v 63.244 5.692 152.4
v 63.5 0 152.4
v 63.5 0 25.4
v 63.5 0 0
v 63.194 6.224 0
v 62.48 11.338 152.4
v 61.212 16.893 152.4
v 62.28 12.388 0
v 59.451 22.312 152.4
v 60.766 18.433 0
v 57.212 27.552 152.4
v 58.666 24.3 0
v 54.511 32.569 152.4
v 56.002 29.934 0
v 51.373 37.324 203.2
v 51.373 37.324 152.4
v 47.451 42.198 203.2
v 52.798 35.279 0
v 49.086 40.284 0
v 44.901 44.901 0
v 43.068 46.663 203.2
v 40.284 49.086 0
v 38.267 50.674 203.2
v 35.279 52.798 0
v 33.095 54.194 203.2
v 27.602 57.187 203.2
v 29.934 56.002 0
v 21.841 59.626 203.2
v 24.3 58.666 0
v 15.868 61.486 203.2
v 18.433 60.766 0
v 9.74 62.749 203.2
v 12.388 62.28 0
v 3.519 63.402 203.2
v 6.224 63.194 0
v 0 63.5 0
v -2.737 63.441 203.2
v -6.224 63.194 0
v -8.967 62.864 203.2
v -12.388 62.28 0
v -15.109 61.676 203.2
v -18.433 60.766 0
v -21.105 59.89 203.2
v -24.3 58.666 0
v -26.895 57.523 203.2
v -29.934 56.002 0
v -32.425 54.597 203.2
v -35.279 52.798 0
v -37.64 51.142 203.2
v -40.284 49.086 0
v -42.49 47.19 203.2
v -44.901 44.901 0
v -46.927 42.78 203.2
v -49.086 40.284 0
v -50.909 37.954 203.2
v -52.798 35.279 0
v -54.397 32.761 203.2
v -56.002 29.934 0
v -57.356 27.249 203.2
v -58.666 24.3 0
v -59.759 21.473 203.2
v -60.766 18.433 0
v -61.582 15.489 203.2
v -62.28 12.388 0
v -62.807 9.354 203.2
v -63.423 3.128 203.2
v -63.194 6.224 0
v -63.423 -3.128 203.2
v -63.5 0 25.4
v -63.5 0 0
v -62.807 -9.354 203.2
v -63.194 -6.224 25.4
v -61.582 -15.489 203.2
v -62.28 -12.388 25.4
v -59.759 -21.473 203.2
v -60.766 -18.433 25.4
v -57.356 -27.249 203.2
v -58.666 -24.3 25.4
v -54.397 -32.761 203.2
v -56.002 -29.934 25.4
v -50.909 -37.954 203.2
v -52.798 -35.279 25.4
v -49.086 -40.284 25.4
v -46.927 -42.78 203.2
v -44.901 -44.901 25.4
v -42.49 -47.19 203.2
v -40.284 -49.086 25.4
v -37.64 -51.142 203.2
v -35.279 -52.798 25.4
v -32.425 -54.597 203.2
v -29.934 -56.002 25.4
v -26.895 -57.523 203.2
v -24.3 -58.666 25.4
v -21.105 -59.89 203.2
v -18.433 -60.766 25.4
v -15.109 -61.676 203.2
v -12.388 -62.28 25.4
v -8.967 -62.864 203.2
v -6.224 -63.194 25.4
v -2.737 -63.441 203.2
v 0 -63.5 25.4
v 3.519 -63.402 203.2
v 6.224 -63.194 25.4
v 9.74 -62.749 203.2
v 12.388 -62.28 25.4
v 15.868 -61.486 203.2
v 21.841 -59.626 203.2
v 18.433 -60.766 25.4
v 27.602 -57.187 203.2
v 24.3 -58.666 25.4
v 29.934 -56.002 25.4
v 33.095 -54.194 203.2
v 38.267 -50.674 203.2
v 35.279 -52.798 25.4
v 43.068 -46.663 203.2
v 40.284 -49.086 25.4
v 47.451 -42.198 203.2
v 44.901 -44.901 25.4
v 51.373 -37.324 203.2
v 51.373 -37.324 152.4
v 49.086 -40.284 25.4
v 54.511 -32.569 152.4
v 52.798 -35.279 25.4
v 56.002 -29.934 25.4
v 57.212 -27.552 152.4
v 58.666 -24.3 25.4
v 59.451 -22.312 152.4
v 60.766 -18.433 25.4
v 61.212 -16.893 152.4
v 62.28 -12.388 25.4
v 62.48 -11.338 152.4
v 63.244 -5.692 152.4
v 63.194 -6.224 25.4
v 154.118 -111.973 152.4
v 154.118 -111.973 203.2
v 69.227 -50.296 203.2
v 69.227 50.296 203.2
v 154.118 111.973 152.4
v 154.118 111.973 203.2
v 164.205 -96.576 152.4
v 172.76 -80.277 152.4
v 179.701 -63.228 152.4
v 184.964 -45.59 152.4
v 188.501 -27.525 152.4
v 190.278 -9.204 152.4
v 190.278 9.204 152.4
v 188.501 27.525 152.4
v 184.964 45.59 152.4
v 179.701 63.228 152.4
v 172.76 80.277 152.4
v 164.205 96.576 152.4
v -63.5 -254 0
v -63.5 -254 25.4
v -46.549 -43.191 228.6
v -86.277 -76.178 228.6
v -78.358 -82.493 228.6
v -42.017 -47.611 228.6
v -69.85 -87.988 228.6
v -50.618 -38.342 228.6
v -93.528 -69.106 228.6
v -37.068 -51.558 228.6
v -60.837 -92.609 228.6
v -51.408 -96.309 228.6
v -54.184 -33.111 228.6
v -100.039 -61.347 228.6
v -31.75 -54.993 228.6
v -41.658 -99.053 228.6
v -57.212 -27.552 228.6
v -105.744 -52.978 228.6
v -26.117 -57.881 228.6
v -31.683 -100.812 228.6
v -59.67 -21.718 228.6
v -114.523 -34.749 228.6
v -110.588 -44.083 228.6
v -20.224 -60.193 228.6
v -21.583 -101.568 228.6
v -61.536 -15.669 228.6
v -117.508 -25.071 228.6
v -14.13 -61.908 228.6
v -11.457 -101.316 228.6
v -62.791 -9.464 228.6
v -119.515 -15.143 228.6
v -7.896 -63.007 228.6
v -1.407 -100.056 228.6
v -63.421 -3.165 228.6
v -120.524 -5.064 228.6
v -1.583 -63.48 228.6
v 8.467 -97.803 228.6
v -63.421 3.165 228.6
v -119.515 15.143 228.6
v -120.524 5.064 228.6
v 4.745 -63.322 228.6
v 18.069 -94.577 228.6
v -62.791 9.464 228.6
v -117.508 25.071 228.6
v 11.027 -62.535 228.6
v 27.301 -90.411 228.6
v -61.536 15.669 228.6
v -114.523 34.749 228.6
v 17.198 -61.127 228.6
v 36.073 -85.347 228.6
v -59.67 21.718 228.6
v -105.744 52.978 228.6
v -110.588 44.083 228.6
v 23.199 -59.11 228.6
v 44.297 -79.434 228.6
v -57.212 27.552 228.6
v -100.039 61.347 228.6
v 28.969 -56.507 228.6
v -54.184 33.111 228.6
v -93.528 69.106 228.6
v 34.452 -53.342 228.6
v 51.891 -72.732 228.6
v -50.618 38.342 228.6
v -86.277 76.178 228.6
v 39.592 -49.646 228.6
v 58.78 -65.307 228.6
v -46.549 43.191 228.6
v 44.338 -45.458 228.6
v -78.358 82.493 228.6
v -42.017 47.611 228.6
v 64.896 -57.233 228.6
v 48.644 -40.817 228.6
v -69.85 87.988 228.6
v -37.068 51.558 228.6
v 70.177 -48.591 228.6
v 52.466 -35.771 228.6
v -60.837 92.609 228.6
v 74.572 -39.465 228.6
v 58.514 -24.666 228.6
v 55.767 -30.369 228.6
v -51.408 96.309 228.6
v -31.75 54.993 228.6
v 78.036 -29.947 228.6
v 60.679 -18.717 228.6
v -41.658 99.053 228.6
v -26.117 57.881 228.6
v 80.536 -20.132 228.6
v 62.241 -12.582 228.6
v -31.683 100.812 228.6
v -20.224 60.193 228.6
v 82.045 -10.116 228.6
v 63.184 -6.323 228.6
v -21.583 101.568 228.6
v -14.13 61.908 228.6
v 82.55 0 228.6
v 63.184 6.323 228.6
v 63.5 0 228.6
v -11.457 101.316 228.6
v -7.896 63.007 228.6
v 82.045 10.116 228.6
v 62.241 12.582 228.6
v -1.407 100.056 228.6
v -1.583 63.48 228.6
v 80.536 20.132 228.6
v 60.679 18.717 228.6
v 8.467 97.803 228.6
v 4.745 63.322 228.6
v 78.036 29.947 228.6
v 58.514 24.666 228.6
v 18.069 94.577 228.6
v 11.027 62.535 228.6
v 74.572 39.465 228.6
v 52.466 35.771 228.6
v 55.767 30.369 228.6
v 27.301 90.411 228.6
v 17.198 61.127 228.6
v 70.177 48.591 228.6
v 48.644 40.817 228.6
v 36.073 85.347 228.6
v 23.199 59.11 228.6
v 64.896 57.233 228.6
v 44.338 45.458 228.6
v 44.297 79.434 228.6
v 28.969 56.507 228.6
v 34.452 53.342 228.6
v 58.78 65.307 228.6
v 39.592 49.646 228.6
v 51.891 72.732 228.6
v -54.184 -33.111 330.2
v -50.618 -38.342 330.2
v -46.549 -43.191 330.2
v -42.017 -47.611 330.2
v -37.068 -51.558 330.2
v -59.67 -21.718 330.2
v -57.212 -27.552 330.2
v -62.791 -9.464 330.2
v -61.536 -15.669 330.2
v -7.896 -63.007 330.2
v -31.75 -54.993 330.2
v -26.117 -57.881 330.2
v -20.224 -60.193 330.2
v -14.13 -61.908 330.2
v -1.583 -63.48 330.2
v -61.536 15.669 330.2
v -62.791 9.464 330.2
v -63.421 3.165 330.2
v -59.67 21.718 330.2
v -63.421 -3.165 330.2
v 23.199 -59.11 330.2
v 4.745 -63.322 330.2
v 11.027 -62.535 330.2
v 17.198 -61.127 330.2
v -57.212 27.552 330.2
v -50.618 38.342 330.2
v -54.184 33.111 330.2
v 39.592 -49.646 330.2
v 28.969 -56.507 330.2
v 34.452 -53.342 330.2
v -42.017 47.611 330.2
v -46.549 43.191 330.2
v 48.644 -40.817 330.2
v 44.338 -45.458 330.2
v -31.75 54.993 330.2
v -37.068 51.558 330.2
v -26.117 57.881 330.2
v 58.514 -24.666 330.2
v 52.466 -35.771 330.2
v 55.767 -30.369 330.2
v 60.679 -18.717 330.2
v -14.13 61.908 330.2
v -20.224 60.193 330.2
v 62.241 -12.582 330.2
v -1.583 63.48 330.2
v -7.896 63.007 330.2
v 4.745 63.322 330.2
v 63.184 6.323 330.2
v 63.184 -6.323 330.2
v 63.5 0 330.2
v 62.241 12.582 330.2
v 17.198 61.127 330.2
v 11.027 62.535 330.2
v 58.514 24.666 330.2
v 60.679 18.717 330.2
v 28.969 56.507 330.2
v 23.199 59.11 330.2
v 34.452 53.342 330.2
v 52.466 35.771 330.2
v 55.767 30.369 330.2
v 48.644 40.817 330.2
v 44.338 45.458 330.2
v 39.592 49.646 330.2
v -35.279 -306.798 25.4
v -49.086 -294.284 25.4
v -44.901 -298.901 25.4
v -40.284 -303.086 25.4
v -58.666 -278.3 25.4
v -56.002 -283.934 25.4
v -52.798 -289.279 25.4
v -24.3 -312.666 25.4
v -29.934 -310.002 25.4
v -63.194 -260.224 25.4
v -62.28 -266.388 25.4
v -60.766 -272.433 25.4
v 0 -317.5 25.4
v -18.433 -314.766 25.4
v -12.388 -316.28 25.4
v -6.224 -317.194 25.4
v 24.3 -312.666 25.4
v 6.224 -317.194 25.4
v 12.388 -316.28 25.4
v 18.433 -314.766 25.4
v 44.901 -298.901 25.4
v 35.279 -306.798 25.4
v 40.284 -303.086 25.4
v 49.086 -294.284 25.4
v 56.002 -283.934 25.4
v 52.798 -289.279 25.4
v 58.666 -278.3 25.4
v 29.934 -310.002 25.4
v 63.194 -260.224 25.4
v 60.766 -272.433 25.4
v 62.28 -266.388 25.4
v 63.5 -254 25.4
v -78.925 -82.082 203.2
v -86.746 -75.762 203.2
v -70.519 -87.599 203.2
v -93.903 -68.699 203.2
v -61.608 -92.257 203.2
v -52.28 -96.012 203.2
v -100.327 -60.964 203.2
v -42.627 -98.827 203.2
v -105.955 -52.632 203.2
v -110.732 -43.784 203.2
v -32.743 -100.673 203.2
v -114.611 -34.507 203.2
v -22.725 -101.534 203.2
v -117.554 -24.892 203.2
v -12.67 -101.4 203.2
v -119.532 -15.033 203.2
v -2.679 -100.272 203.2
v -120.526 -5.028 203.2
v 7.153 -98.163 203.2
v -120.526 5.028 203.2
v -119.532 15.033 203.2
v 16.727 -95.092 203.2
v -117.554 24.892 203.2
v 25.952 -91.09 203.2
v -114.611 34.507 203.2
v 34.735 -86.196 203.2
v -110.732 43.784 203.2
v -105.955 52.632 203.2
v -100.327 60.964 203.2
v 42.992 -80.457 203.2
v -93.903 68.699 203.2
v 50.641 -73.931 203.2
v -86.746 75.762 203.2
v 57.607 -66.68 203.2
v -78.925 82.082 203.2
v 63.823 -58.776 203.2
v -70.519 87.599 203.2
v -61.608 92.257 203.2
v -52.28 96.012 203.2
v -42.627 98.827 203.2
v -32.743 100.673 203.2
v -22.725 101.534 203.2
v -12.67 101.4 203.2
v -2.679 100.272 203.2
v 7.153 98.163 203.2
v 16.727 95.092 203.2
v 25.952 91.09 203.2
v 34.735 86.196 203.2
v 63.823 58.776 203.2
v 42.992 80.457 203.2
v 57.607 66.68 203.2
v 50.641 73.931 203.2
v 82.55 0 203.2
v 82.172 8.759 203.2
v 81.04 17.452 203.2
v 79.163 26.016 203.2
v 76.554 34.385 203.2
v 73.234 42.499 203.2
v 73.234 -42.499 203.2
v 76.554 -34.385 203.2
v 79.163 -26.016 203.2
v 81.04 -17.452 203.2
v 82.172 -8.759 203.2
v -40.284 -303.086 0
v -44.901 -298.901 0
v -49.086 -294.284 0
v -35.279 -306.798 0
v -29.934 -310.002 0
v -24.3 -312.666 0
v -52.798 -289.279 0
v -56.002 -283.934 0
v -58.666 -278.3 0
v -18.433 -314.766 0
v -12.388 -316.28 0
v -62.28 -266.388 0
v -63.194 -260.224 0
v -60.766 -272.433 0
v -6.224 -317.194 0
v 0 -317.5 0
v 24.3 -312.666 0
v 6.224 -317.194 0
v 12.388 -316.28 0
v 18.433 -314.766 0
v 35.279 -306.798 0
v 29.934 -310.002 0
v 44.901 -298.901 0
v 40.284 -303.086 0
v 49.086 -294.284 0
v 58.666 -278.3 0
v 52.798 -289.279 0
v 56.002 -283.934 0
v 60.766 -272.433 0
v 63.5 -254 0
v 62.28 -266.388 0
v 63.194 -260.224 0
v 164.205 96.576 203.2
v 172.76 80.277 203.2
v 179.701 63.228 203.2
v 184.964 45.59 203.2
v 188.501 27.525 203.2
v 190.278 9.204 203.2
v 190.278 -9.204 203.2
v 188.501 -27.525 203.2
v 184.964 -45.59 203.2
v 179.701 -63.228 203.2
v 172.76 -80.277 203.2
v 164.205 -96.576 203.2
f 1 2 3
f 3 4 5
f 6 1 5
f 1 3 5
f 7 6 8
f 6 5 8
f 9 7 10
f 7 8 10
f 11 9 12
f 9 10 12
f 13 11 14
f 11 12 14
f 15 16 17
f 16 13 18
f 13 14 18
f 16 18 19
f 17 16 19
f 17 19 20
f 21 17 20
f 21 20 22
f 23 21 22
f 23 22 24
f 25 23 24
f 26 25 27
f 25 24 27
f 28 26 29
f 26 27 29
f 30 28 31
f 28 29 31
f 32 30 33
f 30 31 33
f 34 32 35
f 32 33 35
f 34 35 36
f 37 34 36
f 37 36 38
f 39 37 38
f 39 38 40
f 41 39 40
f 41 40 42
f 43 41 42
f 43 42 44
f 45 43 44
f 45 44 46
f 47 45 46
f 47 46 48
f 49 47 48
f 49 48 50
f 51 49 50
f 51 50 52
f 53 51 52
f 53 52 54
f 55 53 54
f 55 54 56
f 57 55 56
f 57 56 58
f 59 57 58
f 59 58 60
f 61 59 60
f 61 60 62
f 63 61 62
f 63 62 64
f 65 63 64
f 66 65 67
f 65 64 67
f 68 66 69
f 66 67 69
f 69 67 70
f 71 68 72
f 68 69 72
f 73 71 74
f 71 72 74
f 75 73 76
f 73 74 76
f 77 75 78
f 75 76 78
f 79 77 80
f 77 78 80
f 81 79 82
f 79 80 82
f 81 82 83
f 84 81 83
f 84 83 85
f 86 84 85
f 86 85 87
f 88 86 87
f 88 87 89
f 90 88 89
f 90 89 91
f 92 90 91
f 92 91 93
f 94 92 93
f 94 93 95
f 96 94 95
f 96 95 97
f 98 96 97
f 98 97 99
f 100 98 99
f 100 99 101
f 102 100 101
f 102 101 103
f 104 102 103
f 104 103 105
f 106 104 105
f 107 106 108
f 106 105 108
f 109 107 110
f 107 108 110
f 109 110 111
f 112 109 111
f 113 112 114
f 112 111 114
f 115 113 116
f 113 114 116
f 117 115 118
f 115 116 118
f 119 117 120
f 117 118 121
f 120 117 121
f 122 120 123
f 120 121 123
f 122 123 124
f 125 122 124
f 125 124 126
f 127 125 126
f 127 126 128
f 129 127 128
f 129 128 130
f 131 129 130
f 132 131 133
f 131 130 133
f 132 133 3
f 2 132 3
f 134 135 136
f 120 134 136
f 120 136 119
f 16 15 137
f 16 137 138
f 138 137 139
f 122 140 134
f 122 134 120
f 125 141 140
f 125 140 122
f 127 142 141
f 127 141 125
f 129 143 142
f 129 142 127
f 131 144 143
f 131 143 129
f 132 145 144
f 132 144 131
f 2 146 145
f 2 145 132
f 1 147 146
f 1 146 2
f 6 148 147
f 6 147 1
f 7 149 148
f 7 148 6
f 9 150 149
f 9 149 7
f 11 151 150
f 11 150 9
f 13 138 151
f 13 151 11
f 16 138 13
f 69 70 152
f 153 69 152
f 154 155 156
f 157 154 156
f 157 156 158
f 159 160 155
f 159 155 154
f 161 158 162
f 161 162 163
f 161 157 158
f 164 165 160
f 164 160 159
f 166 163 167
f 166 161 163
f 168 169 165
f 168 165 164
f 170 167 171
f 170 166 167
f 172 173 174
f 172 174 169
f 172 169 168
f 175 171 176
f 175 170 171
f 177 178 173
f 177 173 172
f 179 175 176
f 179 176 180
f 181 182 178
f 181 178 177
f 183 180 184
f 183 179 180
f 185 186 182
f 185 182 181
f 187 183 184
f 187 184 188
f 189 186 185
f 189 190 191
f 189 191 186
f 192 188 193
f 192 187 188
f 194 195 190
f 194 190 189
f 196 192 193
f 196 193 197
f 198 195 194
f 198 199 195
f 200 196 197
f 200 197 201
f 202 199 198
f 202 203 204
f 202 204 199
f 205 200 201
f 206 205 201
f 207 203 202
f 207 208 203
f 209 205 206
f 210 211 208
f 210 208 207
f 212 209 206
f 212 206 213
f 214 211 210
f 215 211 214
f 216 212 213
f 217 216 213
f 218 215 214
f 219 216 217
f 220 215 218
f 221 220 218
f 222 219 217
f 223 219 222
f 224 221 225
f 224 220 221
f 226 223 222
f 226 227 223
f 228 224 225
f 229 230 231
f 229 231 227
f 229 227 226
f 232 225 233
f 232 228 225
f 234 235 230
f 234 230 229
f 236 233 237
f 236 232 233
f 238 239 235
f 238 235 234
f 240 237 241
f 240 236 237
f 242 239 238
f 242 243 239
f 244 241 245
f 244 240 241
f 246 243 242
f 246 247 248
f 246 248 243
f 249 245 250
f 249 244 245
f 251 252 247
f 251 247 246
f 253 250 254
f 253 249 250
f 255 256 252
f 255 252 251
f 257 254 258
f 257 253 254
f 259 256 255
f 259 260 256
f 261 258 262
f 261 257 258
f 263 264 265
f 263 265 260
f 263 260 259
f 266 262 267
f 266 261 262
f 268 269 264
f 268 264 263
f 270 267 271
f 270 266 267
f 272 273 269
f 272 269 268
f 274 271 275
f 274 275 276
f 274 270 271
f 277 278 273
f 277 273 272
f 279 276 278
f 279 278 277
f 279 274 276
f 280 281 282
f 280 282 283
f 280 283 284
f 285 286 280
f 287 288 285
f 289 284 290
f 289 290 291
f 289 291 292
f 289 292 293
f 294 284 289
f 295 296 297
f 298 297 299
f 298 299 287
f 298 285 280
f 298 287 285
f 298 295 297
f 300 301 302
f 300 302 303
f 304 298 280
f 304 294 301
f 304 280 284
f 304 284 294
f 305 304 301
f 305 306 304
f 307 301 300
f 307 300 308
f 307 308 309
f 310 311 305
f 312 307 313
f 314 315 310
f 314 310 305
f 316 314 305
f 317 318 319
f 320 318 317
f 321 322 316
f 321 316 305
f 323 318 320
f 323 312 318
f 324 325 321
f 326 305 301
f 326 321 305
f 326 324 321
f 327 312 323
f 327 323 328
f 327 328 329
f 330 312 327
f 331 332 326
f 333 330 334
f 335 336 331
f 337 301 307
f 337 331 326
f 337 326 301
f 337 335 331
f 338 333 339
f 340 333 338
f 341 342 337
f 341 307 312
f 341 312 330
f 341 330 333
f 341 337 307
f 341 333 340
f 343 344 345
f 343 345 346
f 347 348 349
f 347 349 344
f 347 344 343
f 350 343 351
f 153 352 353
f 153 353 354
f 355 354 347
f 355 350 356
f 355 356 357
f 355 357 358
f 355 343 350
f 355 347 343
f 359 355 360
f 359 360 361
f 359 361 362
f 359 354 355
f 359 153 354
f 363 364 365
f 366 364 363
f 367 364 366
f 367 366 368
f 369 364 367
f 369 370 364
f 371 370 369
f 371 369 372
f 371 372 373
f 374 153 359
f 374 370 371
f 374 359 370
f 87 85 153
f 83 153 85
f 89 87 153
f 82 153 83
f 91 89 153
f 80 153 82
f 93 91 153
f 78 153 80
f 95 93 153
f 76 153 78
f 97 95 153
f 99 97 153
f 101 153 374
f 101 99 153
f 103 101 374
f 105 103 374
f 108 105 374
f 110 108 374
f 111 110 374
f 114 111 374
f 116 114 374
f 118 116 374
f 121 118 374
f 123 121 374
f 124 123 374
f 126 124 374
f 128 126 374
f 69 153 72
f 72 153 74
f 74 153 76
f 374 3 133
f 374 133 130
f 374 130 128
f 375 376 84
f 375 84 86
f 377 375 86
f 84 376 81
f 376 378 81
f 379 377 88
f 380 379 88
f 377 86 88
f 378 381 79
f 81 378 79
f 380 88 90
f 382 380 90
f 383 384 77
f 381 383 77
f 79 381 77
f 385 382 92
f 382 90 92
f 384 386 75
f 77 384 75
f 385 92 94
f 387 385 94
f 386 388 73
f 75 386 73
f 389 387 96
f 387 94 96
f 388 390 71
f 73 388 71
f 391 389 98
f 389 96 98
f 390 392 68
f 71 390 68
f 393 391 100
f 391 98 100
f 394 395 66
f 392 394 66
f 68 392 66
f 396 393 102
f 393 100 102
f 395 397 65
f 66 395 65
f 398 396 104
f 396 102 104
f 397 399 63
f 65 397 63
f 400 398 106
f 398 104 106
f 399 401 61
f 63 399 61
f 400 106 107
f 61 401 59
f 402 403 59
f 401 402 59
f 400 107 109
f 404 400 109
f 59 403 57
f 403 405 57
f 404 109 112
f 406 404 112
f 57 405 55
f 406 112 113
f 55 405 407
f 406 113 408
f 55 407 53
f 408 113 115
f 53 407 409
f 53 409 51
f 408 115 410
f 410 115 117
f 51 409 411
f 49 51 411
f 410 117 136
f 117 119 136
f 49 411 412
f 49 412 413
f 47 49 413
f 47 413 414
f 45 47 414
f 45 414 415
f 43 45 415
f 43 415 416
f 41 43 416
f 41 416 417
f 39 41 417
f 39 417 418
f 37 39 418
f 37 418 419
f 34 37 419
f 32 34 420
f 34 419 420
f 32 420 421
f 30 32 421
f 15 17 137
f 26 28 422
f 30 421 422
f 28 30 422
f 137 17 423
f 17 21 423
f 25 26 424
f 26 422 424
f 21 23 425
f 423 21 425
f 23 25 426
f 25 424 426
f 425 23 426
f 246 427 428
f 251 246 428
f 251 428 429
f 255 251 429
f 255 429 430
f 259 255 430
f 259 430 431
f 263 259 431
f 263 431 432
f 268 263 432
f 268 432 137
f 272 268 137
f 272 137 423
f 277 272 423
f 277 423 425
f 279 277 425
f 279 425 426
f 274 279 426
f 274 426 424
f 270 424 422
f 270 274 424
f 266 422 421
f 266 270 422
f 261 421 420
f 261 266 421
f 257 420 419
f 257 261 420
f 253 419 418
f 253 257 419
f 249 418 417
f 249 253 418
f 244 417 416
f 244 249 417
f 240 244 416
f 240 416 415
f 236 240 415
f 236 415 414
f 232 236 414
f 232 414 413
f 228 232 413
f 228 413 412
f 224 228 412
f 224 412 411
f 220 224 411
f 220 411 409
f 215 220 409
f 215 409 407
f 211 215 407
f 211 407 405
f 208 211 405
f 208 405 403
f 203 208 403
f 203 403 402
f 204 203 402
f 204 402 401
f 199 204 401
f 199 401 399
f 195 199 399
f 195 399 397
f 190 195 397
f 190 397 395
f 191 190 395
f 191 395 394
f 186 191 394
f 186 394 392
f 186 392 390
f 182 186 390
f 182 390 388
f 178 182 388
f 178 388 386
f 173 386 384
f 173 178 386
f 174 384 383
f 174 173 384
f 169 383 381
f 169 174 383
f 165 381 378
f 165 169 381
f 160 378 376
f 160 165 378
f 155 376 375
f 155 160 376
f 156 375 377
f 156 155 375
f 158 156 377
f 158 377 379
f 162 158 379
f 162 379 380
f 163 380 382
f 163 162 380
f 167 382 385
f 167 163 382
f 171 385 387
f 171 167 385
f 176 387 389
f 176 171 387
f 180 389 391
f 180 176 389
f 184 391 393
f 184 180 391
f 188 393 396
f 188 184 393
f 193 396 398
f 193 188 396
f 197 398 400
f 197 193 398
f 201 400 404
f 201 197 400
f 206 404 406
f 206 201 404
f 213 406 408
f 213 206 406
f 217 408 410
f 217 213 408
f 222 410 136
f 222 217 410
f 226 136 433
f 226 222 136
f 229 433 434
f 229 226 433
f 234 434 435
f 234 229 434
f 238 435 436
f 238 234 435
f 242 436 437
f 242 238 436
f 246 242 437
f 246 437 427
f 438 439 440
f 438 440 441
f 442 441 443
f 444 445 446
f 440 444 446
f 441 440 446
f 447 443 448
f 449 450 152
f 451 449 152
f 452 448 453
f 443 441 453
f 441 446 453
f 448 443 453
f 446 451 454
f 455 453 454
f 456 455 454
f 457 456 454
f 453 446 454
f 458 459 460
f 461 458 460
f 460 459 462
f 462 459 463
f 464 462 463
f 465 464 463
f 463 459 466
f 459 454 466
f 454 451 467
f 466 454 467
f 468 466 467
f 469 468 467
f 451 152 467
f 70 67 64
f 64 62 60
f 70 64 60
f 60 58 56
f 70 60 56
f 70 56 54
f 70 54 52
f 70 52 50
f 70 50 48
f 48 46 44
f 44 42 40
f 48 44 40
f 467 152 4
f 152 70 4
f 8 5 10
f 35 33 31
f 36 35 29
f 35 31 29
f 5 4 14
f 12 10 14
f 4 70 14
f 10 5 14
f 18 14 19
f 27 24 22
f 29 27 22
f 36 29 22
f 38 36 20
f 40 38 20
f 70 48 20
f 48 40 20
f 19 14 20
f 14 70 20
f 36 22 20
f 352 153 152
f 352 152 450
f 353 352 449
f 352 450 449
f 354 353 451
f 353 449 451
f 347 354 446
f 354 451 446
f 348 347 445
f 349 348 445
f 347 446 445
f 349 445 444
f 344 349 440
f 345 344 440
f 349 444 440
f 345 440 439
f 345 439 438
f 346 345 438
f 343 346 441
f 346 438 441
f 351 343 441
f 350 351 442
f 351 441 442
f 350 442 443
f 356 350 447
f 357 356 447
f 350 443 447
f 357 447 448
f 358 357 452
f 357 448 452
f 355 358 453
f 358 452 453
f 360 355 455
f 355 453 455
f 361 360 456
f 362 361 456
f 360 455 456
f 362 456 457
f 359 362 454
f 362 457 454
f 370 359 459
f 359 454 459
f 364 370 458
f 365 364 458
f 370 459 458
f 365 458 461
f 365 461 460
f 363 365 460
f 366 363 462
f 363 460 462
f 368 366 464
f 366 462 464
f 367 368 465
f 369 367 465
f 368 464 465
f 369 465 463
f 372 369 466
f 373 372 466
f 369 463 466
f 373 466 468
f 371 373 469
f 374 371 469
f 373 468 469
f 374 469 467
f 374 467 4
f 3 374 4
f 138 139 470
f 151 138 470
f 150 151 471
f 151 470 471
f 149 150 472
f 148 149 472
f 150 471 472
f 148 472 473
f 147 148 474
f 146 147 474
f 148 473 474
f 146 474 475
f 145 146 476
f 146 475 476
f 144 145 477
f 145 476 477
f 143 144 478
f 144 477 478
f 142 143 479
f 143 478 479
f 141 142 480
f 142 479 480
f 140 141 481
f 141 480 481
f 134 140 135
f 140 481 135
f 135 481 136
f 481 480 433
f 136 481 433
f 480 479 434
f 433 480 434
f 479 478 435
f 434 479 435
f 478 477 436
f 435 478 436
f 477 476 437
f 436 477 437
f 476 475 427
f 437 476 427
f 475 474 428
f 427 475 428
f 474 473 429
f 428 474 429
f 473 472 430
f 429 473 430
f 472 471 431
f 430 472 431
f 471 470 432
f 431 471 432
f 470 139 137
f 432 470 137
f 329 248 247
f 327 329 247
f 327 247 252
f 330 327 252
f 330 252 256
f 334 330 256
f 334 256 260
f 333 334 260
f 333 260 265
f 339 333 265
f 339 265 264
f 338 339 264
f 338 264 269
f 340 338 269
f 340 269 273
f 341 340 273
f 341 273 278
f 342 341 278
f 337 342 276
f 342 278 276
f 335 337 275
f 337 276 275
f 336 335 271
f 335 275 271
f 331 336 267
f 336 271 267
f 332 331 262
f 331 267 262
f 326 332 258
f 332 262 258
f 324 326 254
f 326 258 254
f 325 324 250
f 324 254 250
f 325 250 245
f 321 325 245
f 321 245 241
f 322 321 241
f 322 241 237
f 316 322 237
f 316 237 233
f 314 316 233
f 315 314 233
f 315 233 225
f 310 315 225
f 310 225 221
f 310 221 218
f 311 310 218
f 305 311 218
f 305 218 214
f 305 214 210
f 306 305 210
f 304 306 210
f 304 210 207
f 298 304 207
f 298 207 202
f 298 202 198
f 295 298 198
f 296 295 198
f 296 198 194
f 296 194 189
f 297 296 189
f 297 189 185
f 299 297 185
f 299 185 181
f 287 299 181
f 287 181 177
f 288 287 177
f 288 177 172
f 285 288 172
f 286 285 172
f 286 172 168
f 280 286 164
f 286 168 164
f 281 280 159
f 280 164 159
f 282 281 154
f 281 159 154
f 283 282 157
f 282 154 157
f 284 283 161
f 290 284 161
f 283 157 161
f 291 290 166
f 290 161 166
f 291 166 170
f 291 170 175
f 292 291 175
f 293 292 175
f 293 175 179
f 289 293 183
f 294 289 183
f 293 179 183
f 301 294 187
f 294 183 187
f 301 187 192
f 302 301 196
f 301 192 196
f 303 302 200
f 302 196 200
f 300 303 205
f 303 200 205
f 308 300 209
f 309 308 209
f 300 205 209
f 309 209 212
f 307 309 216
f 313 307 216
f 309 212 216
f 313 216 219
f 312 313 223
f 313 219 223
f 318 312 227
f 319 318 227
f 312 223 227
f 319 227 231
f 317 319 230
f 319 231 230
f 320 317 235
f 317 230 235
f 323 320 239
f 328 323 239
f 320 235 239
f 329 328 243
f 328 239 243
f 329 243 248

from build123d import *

# Parameters (mm, degrees)
SKETCH1_R           = 63.5
BOSS_EXTRUDE1_DEPTH = 330.2
BOSS_EXTRUDE2_DEPTH = 25.4
SKETCH3_R           = 101.6
BOSS_EXTRUDE3_DEPTH = 25.4
BOSS_EXTRUDE4_DEPTH = 50.8


with BuildPart() as part:
    # Sketch1 → Boss-Extrude1 (new body)
    with BuildSketch(Plane.XY):
        Circle(SKETCH1_R)
    extrude(amount=BOSS_EXTRUDE1_DEPTH)

    # Sketch2 → Boss-Extrude2 (add)
    with BuildSketch(Plane(origin=(0, 0, 0), x_dir=(-1, 0, 0), z_dir=(0, 0, -1))):
        with BuildLine():
            Line((63.5, 0), (63.5, -254))
            ThreePointArc((63.5, -254), (0, -317.5), (-63.5, -254))
            Line((-63.5, -254), (-63.5, 0))
            ThreePointArc((-63.5, 0), (0, 63.5), (63.5, 0))
        make_face()
    extrude(amount=-BOSS_EXTRUDE2_DEPTH)

    # Sketch3 → Boss-Extrude3 (add)
    with BuildSketch(Plane.XY.offset(228.6)):
        with Locations((-19.05, 0)):
            Circle(SKETCH3_R)
    extrude(amount=-BOSS_EXTRUDE3_DEPTH)

    # Sketch5 → Boss-Extrude4 (add)
    with BuildSketch(Plane.XY.offset(203.2)):
        with BuildLine():
            Line((0, 0), (154.117737428, 111.973090562))
            ThreePointArc((154.117737428, 111.973090562), (190.5, 0), (154.117737428, -111.973090562))
            Line((154.117737428, -111.973090562), (0, 0))
        make_face()
    extrude(amount=-BOSS_EXTRUDE4_DEPTH)


solid = part.part
